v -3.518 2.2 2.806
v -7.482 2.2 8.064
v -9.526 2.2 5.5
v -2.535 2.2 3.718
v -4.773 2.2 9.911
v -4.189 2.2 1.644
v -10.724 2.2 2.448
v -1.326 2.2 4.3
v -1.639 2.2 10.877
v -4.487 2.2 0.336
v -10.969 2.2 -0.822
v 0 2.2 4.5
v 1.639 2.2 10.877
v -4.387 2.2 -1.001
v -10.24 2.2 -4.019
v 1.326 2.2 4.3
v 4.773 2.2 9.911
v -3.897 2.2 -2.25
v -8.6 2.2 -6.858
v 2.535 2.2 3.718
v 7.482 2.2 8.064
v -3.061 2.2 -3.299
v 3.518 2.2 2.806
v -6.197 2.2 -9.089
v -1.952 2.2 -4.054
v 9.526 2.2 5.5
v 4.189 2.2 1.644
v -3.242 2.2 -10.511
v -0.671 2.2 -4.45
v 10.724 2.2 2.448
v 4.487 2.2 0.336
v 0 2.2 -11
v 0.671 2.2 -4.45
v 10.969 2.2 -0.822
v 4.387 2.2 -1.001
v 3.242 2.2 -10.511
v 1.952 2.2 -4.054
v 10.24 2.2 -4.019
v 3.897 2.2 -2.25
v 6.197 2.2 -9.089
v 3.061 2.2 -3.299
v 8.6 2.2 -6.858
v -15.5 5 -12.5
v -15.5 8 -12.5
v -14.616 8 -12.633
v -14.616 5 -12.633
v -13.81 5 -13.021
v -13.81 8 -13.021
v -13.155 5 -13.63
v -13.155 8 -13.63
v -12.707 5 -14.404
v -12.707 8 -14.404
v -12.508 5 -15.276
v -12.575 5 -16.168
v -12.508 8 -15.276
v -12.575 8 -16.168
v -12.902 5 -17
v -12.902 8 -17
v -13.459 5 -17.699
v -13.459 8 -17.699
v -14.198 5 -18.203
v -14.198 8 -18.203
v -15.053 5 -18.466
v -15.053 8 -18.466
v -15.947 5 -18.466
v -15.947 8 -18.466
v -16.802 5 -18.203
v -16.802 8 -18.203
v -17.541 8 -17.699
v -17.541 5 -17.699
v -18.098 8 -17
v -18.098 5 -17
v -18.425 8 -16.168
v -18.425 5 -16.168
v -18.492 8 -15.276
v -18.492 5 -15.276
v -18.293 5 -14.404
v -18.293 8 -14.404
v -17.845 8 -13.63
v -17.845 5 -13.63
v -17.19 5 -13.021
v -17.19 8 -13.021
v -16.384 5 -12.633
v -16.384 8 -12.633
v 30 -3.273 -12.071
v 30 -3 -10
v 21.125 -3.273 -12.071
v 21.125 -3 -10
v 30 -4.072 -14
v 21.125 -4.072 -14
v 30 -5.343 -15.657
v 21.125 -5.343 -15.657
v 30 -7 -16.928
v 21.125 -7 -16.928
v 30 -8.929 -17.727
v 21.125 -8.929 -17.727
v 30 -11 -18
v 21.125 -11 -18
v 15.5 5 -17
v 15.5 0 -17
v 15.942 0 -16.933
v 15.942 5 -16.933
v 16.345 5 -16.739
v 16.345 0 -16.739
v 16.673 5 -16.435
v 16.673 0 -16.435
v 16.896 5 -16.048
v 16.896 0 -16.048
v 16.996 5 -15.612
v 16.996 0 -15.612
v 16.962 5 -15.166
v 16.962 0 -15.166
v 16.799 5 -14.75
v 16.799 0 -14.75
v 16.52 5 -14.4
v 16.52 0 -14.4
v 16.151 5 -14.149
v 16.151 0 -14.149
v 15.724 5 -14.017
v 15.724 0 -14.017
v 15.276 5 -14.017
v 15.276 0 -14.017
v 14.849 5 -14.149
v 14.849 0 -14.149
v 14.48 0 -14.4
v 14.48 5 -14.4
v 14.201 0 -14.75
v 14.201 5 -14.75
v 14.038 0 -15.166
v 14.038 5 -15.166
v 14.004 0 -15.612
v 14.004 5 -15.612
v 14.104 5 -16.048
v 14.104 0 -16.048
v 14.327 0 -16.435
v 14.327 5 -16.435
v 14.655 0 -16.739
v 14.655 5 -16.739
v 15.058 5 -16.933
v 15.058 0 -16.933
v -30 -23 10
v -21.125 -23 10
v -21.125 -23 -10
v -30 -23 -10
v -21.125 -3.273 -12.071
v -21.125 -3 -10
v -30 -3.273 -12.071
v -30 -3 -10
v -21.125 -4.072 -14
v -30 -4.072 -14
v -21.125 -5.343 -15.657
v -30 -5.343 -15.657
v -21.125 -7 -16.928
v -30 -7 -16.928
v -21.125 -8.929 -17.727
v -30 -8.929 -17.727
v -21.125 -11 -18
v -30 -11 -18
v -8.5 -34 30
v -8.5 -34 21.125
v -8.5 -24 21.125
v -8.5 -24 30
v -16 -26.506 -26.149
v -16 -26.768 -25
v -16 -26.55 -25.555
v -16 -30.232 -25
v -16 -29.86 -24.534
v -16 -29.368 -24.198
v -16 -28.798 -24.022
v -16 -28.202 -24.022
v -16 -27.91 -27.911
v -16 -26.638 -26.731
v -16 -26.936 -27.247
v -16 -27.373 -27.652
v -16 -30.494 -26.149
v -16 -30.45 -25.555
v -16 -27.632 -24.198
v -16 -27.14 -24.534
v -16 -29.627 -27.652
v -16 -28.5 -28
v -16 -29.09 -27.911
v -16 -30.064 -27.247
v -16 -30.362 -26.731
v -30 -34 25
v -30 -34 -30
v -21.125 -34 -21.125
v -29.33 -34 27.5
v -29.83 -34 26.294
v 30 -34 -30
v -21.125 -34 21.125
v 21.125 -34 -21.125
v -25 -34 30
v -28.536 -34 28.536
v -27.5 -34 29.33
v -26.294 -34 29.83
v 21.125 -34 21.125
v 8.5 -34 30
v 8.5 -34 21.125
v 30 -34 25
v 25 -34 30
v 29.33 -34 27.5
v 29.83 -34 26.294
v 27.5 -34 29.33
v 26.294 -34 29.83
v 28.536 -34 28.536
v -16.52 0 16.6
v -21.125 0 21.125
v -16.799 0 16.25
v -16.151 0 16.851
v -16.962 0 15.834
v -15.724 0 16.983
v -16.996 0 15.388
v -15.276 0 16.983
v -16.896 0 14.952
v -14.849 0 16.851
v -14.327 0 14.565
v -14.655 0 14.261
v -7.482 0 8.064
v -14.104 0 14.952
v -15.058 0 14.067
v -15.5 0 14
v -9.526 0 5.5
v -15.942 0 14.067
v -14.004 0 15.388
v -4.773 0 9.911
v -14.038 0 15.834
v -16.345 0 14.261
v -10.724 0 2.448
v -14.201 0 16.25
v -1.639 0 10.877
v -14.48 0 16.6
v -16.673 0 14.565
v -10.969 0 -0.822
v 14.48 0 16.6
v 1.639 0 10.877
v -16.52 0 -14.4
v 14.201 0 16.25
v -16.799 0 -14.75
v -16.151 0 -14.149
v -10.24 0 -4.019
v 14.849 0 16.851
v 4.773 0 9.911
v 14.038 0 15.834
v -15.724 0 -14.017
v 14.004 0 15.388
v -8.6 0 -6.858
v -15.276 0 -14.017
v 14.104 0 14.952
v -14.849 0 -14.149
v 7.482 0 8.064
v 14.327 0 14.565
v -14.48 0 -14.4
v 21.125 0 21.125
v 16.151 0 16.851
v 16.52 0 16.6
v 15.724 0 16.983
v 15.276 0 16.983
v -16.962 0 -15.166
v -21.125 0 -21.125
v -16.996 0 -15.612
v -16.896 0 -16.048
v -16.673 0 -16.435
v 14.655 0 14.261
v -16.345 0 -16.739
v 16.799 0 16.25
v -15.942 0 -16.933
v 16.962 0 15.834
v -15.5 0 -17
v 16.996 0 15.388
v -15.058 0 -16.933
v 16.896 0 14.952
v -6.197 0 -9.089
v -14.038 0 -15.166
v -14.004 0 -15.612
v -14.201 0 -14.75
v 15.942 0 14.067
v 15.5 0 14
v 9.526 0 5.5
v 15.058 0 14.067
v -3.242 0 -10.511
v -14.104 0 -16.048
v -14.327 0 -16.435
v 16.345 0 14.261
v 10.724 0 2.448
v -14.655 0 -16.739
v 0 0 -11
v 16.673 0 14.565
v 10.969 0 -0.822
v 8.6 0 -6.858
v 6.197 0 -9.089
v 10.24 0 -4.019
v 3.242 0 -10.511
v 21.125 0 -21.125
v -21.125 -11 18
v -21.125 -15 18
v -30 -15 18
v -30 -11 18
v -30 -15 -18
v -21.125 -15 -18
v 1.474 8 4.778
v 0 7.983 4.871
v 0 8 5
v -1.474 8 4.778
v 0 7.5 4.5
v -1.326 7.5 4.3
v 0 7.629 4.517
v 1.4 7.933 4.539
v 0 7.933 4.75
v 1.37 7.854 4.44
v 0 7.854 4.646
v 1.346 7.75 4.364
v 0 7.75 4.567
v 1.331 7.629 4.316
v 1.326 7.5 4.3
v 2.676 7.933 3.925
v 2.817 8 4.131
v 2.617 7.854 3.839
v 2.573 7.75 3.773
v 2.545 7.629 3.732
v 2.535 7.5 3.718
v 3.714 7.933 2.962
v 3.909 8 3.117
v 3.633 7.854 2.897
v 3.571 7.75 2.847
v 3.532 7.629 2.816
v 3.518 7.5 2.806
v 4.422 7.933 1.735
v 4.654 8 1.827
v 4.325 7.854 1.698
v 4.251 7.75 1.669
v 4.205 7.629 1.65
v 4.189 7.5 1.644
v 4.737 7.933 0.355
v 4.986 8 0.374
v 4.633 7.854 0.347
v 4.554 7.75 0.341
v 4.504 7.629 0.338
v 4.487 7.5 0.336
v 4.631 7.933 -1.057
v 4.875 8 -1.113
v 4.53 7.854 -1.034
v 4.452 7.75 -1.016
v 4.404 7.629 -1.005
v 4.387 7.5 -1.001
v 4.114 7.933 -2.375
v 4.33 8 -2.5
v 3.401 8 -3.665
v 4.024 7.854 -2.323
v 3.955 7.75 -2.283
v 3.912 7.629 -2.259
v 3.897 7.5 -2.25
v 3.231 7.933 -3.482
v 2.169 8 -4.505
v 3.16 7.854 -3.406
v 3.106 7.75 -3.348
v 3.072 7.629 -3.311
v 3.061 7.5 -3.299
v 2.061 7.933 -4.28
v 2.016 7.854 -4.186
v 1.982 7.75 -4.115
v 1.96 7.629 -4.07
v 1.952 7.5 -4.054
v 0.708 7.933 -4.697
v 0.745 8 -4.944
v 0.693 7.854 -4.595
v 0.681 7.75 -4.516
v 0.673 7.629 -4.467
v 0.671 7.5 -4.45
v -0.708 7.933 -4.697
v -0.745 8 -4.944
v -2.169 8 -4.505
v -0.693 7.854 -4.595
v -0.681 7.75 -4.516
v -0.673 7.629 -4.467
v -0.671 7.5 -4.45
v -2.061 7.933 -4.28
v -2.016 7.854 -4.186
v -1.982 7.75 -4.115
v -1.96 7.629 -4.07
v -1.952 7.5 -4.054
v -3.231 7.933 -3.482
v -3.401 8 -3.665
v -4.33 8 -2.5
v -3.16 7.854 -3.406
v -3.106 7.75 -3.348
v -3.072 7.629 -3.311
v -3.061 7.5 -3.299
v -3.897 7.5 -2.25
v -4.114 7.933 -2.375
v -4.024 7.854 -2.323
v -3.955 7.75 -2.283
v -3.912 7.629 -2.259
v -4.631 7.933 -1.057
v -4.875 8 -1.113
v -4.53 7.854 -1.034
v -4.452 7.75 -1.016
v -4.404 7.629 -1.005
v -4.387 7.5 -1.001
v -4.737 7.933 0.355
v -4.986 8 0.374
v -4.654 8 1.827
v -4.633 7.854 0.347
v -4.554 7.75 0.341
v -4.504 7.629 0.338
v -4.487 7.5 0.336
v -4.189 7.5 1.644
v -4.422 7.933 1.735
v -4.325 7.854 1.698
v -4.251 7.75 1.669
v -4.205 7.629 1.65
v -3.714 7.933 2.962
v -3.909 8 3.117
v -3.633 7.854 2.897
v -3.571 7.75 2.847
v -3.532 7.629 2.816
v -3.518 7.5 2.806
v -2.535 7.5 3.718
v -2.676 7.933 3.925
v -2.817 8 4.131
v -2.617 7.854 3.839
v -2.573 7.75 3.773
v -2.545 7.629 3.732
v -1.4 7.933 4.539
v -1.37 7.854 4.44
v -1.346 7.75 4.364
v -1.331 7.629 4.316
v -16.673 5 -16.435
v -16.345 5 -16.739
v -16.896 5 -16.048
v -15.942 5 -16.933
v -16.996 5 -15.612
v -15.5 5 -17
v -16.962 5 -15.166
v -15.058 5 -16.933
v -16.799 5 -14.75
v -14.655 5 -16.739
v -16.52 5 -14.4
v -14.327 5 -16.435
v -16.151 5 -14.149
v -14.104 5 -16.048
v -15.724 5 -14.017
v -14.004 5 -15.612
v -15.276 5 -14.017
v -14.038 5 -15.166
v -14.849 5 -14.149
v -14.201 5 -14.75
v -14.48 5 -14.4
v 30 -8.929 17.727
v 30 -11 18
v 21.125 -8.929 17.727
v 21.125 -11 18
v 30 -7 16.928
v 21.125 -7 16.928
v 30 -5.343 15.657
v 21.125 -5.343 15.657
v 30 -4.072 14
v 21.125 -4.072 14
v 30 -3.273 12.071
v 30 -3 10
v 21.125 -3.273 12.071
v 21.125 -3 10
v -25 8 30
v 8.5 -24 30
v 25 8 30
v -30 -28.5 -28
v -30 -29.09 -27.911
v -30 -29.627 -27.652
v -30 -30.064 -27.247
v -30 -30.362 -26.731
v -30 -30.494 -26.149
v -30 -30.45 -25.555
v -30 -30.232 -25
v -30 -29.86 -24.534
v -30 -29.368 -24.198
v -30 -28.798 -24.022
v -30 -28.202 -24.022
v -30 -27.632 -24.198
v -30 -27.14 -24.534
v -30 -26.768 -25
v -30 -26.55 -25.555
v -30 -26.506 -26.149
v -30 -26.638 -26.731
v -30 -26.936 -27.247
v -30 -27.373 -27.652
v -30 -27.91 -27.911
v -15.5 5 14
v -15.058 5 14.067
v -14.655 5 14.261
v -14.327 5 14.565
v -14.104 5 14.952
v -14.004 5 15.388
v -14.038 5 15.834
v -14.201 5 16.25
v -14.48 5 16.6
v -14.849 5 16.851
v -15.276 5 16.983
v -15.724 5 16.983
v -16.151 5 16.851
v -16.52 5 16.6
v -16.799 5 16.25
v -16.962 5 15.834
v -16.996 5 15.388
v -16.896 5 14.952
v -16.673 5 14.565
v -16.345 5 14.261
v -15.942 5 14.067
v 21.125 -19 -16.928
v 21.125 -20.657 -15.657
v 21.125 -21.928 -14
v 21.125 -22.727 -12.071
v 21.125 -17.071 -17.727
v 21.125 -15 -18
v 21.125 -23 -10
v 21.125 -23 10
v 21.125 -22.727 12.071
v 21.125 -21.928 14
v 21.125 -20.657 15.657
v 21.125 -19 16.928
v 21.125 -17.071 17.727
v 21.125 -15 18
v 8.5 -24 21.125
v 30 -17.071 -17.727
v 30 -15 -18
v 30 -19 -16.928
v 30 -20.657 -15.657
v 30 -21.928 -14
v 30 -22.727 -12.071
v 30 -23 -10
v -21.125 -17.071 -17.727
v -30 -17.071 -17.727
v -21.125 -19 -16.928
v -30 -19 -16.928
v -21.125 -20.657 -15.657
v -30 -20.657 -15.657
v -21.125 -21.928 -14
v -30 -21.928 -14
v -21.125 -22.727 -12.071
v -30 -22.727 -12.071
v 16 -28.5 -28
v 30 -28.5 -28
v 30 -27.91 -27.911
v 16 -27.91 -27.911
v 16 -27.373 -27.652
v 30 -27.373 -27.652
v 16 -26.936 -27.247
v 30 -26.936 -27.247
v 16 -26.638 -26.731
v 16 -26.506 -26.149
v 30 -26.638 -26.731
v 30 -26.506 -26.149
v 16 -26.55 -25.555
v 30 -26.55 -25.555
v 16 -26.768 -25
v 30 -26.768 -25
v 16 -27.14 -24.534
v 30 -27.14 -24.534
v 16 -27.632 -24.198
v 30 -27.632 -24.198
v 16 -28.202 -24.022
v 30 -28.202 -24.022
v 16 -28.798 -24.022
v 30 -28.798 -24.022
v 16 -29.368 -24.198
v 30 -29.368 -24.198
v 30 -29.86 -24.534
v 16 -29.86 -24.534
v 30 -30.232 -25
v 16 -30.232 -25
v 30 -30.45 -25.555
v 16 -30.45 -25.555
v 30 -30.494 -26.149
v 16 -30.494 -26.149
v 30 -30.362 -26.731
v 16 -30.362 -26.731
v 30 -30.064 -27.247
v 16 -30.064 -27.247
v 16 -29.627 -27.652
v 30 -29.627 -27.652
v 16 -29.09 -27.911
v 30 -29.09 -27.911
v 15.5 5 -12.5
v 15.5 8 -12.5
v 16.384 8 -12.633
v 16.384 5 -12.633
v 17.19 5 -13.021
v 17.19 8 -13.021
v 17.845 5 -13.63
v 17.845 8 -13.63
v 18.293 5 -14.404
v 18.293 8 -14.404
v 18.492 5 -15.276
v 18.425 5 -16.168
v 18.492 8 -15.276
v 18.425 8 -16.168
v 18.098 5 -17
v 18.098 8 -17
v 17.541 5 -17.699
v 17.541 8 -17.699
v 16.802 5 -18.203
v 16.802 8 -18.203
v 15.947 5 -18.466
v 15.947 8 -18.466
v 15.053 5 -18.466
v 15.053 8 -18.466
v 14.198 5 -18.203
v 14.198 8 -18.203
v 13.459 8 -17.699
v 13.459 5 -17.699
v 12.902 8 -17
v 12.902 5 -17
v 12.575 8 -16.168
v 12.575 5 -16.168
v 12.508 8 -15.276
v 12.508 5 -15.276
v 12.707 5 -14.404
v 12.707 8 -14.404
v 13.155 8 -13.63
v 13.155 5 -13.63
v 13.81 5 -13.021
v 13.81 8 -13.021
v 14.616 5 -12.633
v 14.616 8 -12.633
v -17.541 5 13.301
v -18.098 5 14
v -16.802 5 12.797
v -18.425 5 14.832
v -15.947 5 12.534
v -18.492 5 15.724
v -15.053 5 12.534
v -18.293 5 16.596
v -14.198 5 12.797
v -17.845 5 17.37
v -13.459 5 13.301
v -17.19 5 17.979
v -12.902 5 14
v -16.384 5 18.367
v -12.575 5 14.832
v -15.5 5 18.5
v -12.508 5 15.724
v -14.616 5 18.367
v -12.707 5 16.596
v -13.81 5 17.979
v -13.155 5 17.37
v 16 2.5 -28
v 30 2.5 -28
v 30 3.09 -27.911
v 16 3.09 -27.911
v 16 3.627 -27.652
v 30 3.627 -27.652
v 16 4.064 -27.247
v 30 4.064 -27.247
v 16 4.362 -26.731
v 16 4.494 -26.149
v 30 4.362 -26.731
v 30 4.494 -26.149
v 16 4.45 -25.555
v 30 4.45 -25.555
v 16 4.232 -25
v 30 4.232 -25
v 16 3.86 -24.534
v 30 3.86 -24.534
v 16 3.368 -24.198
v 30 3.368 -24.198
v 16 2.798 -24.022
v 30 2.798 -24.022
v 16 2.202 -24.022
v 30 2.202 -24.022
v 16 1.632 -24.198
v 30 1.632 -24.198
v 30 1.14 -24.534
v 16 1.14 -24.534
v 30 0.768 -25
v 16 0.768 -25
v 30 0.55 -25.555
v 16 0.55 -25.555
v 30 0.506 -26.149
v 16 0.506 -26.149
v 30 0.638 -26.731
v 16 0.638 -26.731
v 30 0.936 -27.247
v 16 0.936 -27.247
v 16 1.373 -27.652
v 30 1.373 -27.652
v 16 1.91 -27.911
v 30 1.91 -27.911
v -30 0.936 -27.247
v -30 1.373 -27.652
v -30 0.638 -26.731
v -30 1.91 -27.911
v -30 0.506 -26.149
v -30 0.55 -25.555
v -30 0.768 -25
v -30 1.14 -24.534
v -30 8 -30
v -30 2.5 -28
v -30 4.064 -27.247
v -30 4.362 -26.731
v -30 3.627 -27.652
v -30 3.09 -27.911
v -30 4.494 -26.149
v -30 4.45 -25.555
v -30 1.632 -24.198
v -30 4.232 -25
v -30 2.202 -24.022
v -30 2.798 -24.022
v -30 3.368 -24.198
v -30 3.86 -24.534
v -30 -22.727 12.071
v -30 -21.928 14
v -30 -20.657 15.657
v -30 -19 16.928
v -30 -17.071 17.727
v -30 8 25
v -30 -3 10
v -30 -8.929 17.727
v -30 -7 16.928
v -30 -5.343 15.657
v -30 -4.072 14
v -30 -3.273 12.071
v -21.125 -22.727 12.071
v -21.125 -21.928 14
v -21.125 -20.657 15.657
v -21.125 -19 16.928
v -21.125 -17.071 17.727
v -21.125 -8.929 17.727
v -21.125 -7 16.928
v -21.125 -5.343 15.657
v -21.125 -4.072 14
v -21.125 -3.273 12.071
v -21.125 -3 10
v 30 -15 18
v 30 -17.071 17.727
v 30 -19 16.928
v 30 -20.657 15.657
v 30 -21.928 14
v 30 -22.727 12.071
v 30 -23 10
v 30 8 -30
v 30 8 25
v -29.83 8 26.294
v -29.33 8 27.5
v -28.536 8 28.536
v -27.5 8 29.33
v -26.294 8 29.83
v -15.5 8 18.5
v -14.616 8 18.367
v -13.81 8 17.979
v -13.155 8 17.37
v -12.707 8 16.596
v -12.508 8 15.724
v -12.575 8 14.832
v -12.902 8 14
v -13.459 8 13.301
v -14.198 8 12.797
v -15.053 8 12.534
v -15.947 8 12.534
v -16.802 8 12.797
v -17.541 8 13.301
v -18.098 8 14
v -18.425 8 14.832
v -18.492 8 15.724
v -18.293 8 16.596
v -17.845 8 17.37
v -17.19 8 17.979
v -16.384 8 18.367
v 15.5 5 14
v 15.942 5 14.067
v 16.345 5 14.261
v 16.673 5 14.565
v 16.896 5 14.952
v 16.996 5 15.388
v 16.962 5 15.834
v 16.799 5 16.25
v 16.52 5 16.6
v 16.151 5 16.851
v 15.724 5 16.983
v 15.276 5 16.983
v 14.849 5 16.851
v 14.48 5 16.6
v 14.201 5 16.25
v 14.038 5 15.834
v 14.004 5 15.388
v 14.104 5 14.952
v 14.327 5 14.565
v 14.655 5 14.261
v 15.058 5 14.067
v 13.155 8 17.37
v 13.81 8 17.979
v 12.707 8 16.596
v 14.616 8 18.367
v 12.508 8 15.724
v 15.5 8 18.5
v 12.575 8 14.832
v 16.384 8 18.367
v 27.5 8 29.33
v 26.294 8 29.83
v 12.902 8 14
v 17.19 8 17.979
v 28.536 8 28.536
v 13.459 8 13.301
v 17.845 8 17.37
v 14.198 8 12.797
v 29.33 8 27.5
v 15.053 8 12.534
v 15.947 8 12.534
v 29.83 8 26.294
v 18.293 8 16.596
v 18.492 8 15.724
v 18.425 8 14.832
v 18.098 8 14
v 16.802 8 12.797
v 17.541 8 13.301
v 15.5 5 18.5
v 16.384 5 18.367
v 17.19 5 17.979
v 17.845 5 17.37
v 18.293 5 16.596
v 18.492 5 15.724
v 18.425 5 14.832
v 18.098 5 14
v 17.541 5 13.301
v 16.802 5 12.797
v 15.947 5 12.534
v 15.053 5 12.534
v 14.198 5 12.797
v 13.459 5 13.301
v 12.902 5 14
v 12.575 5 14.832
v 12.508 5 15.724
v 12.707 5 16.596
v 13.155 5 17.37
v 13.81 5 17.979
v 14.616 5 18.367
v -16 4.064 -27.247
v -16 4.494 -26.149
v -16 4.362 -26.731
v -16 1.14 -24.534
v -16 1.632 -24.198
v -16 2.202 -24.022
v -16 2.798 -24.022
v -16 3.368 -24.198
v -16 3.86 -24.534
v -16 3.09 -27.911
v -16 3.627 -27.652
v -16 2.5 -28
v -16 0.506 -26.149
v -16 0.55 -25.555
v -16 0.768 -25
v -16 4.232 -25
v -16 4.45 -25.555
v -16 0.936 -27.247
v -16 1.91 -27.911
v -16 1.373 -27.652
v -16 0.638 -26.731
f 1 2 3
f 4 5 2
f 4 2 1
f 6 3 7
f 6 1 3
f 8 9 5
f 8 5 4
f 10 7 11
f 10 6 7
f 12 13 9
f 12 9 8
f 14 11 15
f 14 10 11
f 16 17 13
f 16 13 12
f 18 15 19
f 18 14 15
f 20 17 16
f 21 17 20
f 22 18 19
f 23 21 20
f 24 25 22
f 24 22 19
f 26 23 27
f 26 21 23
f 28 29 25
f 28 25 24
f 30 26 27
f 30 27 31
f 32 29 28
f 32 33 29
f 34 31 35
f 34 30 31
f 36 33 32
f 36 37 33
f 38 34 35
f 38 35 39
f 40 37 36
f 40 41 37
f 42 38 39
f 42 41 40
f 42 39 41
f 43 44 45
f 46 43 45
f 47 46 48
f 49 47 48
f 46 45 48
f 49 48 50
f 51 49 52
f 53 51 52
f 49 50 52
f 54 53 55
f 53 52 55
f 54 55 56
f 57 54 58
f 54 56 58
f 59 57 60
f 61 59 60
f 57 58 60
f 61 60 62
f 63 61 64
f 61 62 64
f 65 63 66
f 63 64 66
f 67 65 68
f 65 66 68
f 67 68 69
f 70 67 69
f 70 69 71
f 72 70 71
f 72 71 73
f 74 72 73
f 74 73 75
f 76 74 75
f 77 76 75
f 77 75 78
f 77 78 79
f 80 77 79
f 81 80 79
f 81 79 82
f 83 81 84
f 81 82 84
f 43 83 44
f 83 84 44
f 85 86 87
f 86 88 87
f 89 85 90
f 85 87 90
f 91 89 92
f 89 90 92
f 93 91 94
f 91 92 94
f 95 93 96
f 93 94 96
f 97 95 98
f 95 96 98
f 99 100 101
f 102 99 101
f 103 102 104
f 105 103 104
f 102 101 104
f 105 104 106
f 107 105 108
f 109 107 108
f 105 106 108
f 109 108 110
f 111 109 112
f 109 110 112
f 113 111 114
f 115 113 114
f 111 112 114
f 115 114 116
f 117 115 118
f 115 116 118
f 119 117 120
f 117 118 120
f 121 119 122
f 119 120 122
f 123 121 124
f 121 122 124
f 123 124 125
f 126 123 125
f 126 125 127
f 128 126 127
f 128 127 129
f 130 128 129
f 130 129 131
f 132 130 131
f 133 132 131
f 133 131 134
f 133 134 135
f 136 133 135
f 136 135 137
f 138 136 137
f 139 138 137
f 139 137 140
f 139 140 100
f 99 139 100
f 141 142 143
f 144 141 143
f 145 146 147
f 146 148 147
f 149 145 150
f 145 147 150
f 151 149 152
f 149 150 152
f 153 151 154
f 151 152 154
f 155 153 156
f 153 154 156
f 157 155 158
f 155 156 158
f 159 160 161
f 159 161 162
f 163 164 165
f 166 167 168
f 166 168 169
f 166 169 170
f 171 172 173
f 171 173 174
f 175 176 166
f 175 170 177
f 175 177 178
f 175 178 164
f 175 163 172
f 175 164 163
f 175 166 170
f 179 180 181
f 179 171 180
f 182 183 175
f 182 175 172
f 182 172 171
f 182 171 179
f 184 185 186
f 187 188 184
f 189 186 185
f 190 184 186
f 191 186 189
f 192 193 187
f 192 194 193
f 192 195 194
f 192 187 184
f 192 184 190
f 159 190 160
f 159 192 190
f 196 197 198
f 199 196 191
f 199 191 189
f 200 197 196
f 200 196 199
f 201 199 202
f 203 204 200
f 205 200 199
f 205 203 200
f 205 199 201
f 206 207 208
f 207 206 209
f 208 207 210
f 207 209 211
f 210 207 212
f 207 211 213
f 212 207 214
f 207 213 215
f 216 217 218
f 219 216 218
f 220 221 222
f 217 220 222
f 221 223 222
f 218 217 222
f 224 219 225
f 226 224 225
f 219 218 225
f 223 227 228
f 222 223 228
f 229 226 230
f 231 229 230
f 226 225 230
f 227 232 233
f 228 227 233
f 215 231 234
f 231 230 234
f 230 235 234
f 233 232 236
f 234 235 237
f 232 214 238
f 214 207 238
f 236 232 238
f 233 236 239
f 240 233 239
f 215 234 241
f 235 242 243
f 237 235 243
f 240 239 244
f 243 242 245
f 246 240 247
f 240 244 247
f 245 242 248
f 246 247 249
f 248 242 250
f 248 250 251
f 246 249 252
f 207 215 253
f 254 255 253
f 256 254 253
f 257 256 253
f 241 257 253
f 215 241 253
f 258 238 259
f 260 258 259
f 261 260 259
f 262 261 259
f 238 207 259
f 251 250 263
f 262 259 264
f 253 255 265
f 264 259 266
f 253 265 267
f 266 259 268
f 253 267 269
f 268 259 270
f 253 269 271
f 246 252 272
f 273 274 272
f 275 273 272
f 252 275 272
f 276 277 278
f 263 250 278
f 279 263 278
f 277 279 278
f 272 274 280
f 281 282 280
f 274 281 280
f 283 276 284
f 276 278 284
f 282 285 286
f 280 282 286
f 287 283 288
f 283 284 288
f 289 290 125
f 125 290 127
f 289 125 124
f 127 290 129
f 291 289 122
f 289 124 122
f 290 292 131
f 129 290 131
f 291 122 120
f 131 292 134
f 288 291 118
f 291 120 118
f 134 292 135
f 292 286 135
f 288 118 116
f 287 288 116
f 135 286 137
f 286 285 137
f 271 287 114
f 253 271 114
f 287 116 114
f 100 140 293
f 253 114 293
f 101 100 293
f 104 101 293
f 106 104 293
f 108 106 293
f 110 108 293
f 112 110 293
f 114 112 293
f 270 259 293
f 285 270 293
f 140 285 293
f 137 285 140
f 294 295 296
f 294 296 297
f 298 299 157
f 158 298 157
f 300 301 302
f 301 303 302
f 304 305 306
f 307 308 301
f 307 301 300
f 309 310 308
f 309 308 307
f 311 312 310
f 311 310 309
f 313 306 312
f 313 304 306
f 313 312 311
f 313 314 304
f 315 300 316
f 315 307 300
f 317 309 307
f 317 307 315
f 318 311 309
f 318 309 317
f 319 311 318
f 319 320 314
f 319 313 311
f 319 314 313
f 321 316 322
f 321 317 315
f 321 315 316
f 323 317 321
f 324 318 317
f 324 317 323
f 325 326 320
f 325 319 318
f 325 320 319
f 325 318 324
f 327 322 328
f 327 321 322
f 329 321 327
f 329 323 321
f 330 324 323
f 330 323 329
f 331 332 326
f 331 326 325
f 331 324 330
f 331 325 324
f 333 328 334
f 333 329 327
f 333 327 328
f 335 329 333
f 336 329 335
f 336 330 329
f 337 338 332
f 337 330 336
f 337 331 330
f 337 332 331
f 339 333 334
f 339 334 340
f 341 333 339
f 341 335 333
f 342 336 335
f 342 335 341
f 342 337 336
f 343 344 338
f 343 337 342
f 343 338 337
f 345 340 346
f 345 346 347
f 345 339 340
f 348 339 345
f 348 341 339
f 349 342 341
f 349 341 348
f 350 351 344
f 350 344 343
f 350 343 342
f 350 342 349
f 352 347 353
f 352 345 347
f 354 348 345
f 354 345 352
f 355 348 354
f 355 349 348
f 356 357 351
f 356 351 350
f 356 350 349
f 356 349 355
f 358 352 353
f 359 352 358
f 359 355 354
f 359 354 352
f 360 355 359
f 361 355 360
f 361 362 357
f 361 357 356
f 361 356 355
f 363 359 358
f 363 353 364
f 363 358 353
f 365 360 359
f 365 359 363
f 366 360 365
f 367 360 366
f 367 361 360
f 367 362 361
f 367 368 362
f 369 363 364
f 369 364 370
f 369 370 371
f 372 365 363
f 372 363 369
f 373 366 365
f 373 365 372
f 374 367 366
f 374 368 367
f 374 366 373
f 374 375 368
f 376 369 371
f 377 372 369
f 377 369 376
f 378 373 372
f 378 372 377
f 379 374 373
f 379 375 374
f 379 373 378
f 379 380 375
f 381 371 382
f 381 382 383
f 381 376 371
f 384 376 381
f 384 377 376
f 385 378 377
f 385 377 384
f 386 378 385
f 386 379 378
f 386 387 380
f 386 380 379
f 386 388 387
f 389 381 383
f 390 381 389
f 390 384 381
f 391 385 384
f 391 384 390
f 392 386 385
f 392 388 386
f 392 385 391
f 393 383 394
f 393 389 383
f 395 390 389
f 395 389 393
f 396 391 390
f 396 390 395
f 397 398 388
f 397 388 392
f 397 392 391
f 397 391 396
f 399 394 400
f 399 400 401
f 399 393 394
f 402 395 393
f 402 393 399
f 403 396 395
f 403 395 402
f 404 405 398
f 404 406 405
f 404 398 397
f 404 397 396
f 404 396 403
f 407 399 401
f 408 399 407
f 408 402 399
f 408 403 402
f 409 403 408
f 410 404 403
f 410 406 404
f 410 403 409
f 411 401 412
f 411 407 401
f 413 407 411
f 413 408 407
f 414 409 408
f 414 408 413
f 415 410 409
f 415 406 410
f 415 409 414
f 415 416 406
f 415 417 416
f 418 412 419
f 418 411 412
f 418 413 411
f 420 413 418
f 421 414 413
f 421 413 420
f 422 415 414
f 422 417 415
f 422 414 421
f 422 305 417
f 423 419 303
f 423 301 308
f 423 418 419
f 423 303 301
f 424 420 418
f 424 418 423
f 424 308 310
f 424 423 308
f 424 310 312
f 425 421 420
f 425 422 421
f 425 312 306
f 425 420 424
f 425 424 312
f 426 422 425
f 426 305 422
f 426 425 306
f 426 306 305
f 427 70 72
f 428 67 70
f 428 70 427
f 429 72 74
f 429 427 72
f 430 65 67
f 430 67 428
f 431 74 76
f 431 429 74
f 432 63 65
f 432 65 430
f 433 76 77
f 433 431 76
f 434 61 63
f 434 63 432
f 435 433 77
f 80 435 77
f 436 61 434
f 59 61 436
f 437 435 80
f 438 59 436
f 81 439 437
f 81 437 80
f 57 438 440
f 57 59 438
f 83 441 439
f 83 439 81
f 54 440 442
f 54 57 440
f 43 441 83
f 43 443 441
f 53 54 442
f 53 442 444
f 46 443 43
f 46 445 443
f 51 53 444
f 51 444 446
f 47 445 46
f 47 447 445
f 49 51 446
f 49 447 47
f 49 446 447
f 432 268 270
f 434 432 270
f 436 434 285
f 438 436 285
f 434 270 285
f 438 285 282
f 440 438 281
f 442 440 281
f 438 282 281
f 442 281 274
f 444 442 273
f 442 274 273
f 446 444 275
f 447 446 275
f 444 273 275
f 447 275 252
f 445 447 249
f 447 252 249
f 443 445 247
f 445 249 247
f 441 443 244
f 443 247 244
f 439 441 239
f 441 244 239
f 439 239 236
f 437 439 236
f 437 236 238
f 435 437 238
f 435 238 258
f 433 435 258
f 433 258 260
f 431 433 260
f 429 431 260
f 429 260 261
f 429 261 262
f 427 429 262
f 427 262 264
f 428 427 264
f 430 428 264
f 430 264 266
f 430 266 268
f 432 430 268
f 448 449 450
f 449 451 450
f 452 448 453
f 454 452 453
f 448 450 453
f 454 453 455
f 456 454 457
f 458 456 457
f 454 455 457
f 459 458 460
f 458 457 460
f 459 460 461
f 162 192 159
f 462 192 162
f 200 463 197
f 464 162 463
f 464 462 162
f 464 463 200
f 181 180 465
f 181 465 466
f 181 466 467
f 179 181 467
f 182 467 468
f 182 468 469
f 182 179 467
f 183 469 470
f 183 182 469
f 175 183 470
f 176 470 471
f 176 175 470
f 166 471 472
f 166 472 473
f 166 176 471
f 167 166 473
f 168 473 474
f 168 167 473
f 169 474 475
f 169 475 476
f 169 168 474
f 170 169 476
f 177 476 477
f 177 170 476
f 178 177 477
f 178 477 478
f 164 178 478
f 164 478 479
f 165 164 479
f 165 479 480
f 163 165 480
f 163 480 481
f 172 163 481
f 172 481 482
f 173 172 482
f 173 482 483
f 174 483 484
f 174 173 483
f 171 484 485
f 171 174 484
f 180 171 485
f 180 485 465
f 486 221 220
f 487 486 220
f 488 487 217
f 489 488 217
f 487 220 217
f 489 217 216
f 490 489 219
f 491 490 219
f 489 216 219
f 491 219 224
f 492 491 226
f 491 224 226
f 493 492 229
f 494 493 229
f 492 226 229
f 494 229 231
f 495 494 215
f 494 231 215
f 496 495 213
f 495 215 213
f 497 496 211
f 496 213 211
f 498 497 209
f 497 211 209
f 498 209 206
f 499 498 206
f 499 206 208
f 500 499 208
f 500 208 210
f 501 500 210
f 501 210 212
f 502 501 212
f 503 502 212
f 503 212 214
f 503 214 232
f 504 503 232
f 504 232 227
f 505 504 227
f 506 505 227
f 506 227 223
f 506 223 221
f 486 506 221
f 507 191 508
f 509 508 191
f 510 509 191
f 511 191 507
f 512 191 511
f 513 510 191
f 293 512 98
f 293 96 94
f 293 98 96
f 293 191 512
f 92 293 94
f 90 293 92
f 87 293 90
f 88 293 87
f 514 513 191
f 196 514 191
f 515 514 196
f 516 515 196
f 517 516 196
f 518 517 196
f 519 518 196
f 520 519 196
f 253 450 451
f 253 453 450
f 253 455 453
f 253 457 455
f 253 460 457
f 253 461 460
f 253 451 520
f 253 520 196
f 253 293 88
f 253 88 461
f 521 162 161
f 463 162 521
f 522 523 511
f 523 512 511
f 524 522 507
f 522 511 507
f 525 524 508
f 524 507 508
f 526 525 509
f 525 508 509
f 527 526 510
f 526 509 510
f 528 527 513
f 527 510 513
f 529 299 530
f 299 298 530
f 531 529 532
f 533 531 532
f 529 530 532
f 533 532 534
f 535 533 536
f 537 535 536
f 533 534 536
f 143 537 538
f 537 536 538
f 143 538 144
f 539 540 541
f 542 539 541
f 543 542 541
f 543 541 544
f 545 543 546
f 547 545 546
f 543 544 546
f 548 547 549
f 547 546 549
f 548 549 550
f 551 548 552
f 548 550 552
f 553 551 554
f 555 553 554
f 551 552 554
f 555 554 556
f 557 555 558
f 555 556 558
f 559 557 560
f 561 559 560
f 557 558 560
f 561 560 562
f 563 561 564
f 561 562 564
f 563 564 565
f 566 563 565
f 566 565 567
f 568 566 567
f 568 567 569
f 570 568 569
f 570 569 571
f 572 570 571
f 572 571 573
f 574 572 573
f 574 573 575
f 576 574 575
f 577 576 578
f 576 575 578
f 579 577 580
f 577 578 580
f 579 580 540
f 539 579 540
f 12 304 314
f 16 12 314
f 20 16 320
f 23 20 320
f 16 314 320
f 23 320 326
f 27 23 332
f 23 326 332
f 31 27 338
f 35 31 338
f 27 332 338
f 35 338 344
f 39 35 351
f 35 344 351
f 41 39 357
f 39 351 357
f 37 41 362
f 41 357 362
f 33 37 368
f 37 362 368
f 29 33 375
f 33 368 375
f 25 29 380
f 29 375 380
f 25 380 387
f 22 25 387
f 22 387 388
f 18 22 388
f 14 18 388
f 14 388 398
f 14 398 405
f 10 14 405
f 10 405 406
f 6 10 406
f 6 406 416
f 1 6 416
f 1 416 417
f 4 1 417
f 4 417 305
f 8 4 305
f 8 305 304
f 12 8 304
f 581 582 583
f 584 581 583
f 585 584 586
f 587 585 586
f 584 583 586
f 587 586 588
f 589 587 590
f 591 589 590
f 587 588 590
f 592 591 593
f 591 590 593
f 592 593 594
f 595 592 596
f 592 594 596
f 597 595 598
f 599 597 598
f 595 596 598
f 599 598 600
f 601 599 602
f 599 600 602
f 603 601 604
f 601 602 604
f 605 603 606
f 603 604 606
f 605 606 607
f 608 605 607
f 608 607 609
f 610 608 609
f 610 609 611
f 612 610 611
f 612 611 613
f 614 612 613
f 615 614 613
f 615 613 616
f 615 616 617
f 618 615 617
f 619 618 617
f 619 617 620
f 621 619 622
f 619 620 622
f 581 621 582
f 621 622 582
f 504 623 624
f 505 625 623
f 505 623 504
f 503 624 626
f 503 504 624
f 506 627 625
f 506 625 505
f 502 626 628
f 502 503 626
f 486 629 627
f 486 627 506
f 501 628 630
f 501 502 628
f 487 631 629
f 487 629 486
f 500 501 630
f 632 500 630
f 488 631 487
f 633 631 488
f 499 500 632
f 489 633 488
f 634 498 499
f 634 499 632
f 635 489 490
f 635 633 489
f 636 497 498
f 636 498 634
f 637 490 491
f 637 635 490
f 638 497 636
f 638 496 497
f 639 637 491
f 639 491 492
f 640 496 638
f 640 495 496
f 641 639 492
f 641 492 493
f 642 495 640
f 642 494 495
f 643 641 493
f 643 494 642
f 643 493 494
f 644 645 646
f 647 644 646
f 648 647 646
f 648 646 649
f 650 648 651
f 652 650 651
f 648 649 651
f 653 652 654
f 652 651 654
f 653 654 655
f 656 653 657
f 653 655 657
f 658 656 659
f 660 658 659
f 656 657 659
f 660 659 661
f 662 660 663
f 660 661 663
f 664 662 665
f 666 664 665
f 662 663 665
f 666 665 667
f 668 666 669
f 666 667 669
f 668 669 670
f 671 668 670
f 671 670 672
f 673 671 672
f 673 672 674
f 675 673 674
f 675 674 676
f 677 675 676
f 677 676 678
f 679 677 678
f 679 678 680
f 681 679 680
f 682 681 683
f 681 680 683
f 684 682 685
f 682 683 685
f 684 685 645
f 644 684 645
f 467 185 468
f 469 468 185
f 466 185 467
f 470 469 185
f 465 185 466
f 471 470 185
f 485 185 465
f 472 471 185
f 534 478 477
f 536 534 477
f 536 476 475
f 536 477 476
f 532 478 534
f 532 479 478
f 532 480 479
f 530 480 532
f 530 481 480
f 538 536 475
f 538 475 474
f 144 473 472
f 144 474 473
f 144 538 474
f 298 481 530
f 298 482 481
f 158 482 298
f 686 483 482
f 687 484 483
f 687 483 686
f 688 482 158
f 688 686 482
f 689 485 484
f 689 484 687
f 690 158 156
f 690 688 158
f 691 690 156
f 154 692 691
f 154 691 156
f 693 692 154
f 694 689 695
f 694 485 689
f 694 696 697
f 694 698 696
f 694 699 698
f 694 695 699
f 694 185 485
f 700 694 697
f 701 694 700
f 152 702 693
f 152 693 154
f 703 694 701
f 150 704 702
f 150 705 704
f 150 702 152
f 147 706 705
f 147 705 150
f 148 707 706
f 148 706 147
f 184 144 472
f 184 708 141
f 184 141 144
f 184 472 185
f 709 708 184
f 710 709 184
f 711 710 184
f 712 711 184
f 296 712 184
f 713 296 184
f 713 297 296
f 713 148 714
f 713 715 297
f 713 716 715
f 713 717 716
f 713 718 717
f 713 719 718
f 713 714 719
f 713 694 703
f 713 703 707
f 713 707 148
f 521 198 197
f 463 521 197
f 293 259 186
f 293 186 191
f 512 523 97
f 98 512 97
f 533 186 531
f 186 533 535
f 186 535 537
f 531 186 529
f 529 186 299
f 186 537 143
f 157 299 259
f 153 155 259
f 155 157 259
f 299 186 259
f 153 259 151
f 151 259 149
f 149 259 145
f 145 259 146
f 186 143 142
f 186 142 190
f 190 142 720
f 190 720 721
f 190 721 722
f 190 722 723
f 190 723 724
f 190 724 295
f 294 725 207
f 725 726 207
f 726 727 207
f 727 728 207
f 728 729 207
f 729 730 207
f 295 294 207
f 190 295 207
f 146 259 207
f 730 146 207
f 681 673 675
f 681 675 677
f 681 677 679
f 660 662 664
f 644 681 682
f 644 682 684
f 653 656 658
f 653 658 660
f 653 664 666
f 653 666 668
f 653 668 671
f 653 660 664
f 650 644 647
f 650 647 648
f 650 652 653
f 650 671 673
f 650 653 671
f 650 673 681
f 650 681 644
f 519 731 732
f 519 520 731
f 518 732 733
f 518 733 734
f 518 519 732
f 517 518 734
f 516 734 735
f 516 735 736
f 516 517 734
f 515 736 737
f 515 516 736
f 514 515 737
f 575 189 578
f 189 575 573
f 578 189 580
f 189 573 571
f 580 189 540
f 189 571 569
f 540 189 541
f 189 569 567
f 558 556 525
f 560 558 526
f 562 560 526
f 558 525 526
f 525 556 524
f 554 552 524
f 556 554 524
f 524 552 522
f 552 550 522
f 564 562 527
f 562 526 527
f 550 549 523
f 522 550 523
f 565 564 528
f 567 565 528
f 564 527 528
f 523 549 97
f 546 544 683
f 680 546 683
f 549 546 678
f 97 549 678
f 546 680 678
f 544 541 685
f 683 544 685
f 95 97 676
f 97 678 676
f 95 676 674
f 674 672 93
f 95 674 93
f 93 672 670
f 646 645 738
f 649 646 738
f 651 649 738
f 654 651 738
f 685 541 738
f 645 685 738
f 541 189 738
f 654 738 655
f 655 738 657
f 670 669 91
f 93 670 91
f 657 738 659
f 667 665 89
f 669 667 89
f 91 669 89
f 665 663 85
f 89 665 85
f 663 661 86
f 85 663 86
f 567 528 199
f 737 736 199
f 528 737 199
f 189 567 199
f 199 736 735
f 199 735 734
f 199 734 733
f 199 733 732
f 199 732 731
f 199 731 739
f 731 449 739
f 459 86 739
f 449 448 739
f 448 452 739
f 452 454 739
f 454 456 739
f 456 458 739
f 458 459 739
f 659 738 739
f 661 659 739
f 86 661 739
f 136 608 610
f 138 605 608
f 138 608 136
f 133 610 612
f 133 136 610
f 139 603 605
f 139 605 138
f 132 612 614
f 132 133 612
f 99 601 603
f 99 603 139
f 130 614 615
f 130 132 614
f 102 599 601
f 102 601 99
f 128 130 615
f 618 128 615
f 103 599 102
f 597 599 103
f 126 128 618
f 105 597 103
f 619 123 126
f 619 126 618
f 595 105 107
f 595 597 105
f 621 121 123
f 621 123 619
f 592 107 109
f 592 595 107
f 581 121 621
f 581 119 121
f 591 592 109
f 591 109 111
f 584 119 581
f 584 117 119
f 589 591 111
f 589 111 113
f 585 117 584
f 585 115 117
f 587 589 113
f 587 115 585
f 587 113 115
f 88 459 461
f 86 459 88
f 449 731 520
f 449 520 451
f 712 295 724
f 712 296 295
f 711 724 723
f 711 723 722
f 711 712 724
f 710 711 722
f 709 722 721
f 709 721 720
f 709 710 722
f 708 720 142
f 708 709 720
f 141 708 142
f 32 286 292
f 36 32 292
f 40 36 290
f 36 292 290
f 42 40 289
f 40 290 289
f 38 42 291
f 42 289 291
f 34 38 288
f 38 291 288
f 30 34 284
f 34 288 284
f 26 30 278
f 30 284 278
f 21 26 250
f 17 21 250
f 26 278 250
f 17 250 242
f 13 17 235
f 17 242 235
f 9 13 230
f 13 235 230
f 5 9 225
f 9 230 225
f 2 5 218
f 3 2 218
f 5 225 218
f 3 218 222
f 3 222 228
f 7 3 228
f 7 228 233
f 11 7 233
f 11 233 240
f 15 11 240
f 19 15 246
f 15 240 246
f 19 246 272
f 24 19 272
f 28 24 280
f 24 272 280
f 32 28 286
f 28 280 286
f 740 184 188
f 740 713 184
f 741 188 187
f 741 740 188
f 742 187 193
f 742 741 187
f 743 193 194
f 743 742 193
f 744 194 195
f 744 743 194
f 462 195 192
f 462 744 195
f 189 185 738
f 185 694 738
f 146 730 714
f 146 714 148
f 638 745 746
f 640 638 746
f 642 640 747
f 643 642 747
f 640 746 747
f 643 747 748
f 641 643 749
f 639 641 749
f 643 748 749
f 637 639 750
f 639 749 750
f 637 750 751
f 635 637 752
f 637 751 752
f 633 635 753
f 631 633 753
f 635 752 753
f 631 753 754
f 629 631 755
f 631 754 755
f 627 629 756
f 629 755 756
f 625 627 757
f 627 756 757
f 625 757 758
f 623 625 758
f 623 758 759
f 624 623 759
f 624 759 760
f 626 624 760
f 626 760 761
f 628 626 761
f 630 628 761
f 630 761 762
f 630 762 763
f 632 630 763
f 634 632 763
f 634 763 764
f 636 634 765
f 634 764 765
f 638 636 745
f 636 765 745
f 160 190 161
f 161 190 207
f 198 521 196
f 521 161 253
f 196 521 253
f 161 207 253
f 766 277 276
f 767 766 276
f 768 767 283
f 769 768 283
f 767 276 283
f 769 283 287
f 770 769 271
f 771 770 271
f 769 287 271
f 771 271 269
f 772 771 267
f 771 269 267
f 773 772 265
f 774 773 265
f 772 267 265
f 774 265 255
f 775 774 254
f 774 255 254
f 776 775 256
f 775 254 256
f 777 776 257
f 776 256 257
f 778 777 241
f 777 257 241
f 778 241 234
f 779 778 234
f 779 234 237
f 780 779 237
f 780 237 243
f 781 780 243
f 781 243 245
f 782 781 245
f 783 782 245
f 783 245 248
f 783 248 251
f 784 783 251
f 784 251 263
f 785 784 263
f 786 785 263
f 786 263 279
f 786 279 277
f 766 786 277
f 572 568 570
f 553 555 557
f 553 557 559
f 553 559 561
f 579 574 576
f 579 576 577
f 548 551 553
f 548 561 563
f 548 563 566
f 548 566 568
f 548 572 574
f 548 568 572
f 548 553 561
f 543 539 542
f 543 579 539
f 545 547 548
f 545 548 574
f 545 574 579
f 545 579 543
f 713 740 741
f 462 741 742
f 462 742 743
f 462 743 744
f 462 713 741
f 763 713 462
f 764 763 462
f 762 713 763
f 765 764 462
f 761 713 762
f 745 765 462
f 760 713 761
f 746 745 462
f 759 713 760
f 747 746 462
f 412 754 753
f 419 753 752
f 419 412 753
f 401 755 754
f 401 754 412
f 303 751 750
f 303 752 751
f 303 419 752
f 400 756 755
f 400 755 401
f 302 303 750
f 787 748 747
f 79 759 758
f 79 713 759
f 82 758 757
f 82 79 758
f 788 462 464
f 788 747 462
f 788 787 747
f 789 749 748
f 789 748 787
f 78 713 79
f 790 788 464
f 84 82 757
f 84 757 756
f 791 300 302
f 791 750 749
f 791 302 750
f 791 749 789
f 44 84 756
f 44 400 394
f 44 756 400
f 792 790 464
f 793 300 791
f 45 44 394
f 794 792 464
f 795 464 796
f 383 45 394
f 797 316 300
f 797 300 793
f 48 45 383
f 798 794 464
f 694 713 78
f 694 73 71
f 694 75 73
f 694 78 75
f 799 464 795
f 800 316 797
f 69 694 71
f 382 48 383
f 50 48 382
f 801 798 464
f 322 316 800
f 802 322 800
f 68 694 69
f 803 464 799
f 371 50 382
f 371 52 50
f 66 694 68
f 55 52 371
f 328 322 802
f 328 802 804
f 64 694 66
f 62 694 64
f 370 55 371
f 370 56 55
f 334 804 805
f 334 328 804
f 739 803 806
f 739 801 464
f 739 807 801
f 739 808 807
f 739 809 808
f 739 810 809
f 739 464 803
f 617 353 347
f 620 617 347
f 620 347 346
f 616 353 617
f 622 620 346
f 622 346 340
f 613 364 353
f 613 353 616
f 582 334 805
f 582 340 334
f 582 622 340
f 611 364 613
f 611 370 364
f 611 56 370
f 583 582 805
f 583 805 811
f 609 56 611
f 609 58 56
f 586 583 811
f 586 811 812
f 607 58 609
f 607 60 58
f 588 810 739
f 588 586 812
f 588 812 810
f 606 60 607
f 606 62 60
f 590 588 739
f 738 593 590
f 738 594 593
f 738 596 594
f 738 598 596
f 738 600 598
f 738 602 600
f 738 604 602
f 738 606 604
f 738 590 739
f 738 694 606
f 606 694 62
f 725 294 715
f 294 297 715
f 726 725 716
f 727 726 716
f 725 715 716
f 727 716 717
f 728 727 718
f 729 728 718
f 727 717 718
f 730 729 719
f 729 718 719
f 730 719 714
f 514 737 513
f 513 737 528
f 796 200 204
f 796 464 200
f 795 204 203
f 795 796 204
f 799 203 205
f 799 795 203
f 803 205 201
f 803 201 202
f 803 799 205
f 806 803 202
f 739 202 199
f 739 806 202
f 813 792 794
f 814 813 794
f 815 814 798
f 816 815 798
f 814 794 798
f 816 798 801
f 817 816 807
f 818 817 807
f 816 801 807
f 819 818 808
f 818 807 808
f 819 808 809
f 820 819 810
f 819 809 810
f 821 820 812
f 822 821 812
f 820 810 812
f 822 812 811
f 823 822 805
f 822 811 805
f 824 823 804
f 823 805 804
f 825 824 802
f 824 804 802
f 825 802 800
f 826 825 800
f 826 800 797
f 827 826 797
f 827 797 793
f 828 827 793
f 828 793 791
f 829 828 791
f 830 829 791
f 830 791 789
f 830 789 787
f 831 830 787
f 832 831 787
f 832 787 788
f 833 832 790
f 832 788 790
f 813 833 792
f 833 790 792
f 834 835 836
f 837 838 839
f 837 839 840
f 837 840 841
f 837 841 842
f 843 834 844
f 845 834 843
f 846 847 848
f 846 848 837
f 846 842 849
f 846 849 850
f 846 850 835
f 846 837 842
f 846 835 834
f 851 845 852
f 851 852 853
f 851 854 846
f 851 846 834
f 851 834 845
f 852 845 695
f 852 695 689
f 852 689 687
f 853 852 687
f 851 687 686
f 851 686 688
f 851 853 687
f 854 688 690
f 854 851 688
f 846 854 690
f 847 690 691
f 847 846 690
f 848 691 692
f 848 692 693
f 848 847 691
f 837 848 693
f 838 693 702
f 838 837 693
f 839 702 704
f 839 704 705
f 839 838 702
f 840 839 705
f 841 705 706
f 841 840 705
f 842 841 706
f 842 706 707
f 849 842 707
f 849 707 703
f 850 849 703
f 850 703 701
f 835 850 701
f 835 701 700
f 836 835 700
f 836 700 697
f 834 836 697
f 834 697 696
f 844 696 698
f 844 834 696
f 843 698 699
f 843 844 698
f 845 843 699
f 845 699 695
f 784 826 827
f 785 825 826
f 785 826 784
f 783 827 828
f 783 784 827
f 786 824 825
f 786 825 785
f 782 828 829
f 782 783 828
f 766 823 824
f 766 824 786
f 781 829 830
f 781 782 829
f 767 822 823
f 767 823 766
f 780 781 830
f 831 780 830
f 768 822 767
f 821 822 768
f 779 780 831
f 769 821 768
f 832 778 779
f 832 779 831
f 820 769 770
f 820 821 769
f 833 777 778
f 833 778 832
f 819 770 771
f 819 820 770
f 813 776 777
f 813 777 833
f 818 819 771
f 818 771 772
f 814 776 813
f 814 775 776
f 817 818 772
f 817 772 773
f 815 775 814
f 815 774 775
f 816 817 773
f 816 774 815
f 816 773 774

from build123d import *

# Parameters (mm, degrees)
SKETCH1_W           = 60
SKETCH1_H           = 60
BOSS_EXTRUDE1_DEPTH = 8
SKETCH2_R           = 4.5
CUT_EXTRUDE1_DEPTH  = 8
SKETCH3_R           = 11
CUT_EXTRUDE2_DEPTH  = 2.2
SKETCH4_R           = 1.5
CUT_EXTRUDE3_DEPTH  = 11.2
SKETCH6_R           = 3
CUT_EXTRUDE4_DEPTH  = 3
SKETCH7_W           = 60
SKETCH7_H           = 60
SKETCH7_W_2         = 42.25
SKETCH7_H_2         = 42.25
BOSS_EXTRUDE3_DEPTH = 34
SKETCH8_W           = 17
SKETCH8_H           = 8.88
CUT_EXTRUDE5_DEPTH  = 10
SKETCH9_W           = 36
SKETCH9_H           = 20
CUT_EXTRUDE6_DEPTH  = 60
FILLET1_R           = 0.5
FILLET2_R           = 8
FILLET3_R           = 5
SKETCH10_R          = 2
CUT_EXTRUDE7_DEPTH  = 14
CUT_EXTRUDE8_START  = -14
SKETCH11_R          = 2
CUT_EXTRUDE8_DEPTH  = 14


with BuildPart() as part:
    # Sketch1 → Boss-Extrude1 (new body)
    with BuildSketch(Plane(origin=(0, 0, 0), x_dir=(1, 0, 0), z_dir=(0, 1, 0))):
        Rectangle(SKETCH1_W, SKETCH1_H)
    extrude(amount=BOSS_EXTRUDE1_DEPTH)

    # Sketch2 → Cut-Extrude1 (cut)
    with BuildSketch(Plane(origin=(0, 8, 0), x_dir=(1, 0, 0), z_dir=(0, 1, 0))):
        with Locations(Location((0, 0, 0), (0, 0, 270))):
            Circle(SKETCH2_R)
    extrude(amount=-CUT_EXTRUDE1_DEPTH, mode=Mode.SUBTRACT)

    # Sketch3 → Cut-Extrude2 (cut)
    with BuildSketch(Plane.XZ):
        with Locations(Location((0, 0, 0), (0, 0, 270))):
            Circle(SKETCH3_R)
    extrude(amount=-CUT_EXTRUDE2_DEPTH, mode=Mode.SUBTRACT)

    # Sketch4 → Cut-Extrude3 (cut)
    with BuildSketch(Plane.XZ):
        with Locations(Location((-15.5, 15.5, 0), (0, 0, 270))):
            Circle(SKETCH4_R)
        with Locations(Location((-15.5, -15.5, 0), (0, 0, 270))):
            Circle(SKETCH4_R)
        with Locations(Location((15.5, -15.5, 0), (0, 0, 270))):
            Circle(SKETCH4_R)
        with Locations(Location((15.5, 15.5, 0), (0, 0, 270))):
            Circle(SKETCH4_R)
    extrude(amount=-CUT_EXTRUDE3_DEPTH, mode=Mode.SUBTRACT)

    # Sketch6 → Cut-Extrude4 (cut)
    with BuildSketch(Plane(origin=(0, 8, 0), x_dir=(1, 0, 0), z_dir=(0, 1, 0))):
        with Locations(Location((-15.5, 15.5, 0), (0, 0, 270))):
            Circle(SKETCH6_R)
        with Locations(Location((15.5, 15.5, 0), (0, 0, 270))):
            Circle(SKETCH6_R)
        with Locations(Location((-15.5, -15.5, 0), (0, 0, 270))):
            Circle(SKETCH6_R)
        with Locations(Location((15.5, -15.5, 0), (0, 0, 270))):
            Circle(SKETCH6_R)
    extrude(amount=-CUT_EXTRUDE4_DEPTH, mode=Mode.SUBTRACT)

    # Sketch7 → Boss-Extrude3 (add)
    with BuildSketch(Plane.XZ):
        Rectangle(SKETCH7_W, SKETCH7_H)
        Rectangle(SKETCH7_W_2, SKETCH7_H_2, mode=Mode.SUBTRACT)
    extrude(amount=BOSS_EXTRUDE3_DEPTH)

    # Sketch8 → Cut-Extrude5 (cut)
    with BuildSketch(Plane.XZ.offset(34)):
        with Locations((0, 25.56)):
            Rectangle(SKETCH8_W, SKETCH8_H)
    extrude(amount=-CUT_EXTRUDE5_DEPTH, mode=Mode.SUBTRACT)

    # Sketch9 → Cut-Extrude6 (cut)
    with BuildSketch(Plane(origin=(30, 0, 0), x_dir=(0, 0, -1), z_dir=(1, 0, 0))):
        with Locations((0, -13)):
            Rectangle(SKETCH9_W, SKETCH9_H)
    extrude(amount=-CUT_EXTRUDE6_DEPTH, mode=Mode.SUBTRACT)

    # Fillet1
    fillet1_edges = [part.edges().sort_by_distance(p)[0] for p in [
        (0, 8, -4.5),
    ]]
    fillet(fillet1_edges, radius=FILLET1_R)

    # Fillet2
    fillet2_edges = [part.edges().sort_by_distance(p)[0] for p in [
        (-25.5625, -23, 18),
        (-25.5625, -3, 18),
        (-25.5625, -3, -18),
        (-25.5625, -23, -18),
        (25.5625, -23, 18),
        (25.5625, -3, 18),
        (25.5625, -3, -18),
        (25.5625, -23, -18),
    ]]
    fillet(fillet2_edges, radius=FILLET2_R)

    # Fillet3
    fillet3_edges = [part.edges().sort_by_distance(p)[0] for p in [
        (30, -13, 30),
        (-30, -13, 30),
    ]]
    fillet(fillet3_edges, radius=FILLET3_R)

    # Sketch10 → Cut-Extrude7 (cut)
    with BuildSketch(Plane(origin=(30, 0, 0), x_dir=(0, 0, -1), z_dir=(1, 0, 0))):
        with Locations((26, -28.5)):
            Circle(SKETCH10_R)
        with Locations((26, 2.5)):
            Circle(SKETCH10_R)
    extrude(amount=-CUT_EXTRUDE7_DEPTH, mode=Mode.SUBTRACT)

    # Sketch11 → Cut-Extrude8 (cut)
    with BuildSketch(Plane.ZY.offset(30).offset(CUT_EXTRUDE8_START)):
        with Locations(Location((-26, 2.5, 0), (0, 0, 180))):
            Circle(SKETCH11_R)
        with Locations(Location((-26, -28.5, 0), (0, 0, 180))):
            Circle(SKETCH11_R)
    extrude(amount=CUT_EXTRUDE8_DEPTH, mode=Mode.SUBTRACT)


solid = part.part
